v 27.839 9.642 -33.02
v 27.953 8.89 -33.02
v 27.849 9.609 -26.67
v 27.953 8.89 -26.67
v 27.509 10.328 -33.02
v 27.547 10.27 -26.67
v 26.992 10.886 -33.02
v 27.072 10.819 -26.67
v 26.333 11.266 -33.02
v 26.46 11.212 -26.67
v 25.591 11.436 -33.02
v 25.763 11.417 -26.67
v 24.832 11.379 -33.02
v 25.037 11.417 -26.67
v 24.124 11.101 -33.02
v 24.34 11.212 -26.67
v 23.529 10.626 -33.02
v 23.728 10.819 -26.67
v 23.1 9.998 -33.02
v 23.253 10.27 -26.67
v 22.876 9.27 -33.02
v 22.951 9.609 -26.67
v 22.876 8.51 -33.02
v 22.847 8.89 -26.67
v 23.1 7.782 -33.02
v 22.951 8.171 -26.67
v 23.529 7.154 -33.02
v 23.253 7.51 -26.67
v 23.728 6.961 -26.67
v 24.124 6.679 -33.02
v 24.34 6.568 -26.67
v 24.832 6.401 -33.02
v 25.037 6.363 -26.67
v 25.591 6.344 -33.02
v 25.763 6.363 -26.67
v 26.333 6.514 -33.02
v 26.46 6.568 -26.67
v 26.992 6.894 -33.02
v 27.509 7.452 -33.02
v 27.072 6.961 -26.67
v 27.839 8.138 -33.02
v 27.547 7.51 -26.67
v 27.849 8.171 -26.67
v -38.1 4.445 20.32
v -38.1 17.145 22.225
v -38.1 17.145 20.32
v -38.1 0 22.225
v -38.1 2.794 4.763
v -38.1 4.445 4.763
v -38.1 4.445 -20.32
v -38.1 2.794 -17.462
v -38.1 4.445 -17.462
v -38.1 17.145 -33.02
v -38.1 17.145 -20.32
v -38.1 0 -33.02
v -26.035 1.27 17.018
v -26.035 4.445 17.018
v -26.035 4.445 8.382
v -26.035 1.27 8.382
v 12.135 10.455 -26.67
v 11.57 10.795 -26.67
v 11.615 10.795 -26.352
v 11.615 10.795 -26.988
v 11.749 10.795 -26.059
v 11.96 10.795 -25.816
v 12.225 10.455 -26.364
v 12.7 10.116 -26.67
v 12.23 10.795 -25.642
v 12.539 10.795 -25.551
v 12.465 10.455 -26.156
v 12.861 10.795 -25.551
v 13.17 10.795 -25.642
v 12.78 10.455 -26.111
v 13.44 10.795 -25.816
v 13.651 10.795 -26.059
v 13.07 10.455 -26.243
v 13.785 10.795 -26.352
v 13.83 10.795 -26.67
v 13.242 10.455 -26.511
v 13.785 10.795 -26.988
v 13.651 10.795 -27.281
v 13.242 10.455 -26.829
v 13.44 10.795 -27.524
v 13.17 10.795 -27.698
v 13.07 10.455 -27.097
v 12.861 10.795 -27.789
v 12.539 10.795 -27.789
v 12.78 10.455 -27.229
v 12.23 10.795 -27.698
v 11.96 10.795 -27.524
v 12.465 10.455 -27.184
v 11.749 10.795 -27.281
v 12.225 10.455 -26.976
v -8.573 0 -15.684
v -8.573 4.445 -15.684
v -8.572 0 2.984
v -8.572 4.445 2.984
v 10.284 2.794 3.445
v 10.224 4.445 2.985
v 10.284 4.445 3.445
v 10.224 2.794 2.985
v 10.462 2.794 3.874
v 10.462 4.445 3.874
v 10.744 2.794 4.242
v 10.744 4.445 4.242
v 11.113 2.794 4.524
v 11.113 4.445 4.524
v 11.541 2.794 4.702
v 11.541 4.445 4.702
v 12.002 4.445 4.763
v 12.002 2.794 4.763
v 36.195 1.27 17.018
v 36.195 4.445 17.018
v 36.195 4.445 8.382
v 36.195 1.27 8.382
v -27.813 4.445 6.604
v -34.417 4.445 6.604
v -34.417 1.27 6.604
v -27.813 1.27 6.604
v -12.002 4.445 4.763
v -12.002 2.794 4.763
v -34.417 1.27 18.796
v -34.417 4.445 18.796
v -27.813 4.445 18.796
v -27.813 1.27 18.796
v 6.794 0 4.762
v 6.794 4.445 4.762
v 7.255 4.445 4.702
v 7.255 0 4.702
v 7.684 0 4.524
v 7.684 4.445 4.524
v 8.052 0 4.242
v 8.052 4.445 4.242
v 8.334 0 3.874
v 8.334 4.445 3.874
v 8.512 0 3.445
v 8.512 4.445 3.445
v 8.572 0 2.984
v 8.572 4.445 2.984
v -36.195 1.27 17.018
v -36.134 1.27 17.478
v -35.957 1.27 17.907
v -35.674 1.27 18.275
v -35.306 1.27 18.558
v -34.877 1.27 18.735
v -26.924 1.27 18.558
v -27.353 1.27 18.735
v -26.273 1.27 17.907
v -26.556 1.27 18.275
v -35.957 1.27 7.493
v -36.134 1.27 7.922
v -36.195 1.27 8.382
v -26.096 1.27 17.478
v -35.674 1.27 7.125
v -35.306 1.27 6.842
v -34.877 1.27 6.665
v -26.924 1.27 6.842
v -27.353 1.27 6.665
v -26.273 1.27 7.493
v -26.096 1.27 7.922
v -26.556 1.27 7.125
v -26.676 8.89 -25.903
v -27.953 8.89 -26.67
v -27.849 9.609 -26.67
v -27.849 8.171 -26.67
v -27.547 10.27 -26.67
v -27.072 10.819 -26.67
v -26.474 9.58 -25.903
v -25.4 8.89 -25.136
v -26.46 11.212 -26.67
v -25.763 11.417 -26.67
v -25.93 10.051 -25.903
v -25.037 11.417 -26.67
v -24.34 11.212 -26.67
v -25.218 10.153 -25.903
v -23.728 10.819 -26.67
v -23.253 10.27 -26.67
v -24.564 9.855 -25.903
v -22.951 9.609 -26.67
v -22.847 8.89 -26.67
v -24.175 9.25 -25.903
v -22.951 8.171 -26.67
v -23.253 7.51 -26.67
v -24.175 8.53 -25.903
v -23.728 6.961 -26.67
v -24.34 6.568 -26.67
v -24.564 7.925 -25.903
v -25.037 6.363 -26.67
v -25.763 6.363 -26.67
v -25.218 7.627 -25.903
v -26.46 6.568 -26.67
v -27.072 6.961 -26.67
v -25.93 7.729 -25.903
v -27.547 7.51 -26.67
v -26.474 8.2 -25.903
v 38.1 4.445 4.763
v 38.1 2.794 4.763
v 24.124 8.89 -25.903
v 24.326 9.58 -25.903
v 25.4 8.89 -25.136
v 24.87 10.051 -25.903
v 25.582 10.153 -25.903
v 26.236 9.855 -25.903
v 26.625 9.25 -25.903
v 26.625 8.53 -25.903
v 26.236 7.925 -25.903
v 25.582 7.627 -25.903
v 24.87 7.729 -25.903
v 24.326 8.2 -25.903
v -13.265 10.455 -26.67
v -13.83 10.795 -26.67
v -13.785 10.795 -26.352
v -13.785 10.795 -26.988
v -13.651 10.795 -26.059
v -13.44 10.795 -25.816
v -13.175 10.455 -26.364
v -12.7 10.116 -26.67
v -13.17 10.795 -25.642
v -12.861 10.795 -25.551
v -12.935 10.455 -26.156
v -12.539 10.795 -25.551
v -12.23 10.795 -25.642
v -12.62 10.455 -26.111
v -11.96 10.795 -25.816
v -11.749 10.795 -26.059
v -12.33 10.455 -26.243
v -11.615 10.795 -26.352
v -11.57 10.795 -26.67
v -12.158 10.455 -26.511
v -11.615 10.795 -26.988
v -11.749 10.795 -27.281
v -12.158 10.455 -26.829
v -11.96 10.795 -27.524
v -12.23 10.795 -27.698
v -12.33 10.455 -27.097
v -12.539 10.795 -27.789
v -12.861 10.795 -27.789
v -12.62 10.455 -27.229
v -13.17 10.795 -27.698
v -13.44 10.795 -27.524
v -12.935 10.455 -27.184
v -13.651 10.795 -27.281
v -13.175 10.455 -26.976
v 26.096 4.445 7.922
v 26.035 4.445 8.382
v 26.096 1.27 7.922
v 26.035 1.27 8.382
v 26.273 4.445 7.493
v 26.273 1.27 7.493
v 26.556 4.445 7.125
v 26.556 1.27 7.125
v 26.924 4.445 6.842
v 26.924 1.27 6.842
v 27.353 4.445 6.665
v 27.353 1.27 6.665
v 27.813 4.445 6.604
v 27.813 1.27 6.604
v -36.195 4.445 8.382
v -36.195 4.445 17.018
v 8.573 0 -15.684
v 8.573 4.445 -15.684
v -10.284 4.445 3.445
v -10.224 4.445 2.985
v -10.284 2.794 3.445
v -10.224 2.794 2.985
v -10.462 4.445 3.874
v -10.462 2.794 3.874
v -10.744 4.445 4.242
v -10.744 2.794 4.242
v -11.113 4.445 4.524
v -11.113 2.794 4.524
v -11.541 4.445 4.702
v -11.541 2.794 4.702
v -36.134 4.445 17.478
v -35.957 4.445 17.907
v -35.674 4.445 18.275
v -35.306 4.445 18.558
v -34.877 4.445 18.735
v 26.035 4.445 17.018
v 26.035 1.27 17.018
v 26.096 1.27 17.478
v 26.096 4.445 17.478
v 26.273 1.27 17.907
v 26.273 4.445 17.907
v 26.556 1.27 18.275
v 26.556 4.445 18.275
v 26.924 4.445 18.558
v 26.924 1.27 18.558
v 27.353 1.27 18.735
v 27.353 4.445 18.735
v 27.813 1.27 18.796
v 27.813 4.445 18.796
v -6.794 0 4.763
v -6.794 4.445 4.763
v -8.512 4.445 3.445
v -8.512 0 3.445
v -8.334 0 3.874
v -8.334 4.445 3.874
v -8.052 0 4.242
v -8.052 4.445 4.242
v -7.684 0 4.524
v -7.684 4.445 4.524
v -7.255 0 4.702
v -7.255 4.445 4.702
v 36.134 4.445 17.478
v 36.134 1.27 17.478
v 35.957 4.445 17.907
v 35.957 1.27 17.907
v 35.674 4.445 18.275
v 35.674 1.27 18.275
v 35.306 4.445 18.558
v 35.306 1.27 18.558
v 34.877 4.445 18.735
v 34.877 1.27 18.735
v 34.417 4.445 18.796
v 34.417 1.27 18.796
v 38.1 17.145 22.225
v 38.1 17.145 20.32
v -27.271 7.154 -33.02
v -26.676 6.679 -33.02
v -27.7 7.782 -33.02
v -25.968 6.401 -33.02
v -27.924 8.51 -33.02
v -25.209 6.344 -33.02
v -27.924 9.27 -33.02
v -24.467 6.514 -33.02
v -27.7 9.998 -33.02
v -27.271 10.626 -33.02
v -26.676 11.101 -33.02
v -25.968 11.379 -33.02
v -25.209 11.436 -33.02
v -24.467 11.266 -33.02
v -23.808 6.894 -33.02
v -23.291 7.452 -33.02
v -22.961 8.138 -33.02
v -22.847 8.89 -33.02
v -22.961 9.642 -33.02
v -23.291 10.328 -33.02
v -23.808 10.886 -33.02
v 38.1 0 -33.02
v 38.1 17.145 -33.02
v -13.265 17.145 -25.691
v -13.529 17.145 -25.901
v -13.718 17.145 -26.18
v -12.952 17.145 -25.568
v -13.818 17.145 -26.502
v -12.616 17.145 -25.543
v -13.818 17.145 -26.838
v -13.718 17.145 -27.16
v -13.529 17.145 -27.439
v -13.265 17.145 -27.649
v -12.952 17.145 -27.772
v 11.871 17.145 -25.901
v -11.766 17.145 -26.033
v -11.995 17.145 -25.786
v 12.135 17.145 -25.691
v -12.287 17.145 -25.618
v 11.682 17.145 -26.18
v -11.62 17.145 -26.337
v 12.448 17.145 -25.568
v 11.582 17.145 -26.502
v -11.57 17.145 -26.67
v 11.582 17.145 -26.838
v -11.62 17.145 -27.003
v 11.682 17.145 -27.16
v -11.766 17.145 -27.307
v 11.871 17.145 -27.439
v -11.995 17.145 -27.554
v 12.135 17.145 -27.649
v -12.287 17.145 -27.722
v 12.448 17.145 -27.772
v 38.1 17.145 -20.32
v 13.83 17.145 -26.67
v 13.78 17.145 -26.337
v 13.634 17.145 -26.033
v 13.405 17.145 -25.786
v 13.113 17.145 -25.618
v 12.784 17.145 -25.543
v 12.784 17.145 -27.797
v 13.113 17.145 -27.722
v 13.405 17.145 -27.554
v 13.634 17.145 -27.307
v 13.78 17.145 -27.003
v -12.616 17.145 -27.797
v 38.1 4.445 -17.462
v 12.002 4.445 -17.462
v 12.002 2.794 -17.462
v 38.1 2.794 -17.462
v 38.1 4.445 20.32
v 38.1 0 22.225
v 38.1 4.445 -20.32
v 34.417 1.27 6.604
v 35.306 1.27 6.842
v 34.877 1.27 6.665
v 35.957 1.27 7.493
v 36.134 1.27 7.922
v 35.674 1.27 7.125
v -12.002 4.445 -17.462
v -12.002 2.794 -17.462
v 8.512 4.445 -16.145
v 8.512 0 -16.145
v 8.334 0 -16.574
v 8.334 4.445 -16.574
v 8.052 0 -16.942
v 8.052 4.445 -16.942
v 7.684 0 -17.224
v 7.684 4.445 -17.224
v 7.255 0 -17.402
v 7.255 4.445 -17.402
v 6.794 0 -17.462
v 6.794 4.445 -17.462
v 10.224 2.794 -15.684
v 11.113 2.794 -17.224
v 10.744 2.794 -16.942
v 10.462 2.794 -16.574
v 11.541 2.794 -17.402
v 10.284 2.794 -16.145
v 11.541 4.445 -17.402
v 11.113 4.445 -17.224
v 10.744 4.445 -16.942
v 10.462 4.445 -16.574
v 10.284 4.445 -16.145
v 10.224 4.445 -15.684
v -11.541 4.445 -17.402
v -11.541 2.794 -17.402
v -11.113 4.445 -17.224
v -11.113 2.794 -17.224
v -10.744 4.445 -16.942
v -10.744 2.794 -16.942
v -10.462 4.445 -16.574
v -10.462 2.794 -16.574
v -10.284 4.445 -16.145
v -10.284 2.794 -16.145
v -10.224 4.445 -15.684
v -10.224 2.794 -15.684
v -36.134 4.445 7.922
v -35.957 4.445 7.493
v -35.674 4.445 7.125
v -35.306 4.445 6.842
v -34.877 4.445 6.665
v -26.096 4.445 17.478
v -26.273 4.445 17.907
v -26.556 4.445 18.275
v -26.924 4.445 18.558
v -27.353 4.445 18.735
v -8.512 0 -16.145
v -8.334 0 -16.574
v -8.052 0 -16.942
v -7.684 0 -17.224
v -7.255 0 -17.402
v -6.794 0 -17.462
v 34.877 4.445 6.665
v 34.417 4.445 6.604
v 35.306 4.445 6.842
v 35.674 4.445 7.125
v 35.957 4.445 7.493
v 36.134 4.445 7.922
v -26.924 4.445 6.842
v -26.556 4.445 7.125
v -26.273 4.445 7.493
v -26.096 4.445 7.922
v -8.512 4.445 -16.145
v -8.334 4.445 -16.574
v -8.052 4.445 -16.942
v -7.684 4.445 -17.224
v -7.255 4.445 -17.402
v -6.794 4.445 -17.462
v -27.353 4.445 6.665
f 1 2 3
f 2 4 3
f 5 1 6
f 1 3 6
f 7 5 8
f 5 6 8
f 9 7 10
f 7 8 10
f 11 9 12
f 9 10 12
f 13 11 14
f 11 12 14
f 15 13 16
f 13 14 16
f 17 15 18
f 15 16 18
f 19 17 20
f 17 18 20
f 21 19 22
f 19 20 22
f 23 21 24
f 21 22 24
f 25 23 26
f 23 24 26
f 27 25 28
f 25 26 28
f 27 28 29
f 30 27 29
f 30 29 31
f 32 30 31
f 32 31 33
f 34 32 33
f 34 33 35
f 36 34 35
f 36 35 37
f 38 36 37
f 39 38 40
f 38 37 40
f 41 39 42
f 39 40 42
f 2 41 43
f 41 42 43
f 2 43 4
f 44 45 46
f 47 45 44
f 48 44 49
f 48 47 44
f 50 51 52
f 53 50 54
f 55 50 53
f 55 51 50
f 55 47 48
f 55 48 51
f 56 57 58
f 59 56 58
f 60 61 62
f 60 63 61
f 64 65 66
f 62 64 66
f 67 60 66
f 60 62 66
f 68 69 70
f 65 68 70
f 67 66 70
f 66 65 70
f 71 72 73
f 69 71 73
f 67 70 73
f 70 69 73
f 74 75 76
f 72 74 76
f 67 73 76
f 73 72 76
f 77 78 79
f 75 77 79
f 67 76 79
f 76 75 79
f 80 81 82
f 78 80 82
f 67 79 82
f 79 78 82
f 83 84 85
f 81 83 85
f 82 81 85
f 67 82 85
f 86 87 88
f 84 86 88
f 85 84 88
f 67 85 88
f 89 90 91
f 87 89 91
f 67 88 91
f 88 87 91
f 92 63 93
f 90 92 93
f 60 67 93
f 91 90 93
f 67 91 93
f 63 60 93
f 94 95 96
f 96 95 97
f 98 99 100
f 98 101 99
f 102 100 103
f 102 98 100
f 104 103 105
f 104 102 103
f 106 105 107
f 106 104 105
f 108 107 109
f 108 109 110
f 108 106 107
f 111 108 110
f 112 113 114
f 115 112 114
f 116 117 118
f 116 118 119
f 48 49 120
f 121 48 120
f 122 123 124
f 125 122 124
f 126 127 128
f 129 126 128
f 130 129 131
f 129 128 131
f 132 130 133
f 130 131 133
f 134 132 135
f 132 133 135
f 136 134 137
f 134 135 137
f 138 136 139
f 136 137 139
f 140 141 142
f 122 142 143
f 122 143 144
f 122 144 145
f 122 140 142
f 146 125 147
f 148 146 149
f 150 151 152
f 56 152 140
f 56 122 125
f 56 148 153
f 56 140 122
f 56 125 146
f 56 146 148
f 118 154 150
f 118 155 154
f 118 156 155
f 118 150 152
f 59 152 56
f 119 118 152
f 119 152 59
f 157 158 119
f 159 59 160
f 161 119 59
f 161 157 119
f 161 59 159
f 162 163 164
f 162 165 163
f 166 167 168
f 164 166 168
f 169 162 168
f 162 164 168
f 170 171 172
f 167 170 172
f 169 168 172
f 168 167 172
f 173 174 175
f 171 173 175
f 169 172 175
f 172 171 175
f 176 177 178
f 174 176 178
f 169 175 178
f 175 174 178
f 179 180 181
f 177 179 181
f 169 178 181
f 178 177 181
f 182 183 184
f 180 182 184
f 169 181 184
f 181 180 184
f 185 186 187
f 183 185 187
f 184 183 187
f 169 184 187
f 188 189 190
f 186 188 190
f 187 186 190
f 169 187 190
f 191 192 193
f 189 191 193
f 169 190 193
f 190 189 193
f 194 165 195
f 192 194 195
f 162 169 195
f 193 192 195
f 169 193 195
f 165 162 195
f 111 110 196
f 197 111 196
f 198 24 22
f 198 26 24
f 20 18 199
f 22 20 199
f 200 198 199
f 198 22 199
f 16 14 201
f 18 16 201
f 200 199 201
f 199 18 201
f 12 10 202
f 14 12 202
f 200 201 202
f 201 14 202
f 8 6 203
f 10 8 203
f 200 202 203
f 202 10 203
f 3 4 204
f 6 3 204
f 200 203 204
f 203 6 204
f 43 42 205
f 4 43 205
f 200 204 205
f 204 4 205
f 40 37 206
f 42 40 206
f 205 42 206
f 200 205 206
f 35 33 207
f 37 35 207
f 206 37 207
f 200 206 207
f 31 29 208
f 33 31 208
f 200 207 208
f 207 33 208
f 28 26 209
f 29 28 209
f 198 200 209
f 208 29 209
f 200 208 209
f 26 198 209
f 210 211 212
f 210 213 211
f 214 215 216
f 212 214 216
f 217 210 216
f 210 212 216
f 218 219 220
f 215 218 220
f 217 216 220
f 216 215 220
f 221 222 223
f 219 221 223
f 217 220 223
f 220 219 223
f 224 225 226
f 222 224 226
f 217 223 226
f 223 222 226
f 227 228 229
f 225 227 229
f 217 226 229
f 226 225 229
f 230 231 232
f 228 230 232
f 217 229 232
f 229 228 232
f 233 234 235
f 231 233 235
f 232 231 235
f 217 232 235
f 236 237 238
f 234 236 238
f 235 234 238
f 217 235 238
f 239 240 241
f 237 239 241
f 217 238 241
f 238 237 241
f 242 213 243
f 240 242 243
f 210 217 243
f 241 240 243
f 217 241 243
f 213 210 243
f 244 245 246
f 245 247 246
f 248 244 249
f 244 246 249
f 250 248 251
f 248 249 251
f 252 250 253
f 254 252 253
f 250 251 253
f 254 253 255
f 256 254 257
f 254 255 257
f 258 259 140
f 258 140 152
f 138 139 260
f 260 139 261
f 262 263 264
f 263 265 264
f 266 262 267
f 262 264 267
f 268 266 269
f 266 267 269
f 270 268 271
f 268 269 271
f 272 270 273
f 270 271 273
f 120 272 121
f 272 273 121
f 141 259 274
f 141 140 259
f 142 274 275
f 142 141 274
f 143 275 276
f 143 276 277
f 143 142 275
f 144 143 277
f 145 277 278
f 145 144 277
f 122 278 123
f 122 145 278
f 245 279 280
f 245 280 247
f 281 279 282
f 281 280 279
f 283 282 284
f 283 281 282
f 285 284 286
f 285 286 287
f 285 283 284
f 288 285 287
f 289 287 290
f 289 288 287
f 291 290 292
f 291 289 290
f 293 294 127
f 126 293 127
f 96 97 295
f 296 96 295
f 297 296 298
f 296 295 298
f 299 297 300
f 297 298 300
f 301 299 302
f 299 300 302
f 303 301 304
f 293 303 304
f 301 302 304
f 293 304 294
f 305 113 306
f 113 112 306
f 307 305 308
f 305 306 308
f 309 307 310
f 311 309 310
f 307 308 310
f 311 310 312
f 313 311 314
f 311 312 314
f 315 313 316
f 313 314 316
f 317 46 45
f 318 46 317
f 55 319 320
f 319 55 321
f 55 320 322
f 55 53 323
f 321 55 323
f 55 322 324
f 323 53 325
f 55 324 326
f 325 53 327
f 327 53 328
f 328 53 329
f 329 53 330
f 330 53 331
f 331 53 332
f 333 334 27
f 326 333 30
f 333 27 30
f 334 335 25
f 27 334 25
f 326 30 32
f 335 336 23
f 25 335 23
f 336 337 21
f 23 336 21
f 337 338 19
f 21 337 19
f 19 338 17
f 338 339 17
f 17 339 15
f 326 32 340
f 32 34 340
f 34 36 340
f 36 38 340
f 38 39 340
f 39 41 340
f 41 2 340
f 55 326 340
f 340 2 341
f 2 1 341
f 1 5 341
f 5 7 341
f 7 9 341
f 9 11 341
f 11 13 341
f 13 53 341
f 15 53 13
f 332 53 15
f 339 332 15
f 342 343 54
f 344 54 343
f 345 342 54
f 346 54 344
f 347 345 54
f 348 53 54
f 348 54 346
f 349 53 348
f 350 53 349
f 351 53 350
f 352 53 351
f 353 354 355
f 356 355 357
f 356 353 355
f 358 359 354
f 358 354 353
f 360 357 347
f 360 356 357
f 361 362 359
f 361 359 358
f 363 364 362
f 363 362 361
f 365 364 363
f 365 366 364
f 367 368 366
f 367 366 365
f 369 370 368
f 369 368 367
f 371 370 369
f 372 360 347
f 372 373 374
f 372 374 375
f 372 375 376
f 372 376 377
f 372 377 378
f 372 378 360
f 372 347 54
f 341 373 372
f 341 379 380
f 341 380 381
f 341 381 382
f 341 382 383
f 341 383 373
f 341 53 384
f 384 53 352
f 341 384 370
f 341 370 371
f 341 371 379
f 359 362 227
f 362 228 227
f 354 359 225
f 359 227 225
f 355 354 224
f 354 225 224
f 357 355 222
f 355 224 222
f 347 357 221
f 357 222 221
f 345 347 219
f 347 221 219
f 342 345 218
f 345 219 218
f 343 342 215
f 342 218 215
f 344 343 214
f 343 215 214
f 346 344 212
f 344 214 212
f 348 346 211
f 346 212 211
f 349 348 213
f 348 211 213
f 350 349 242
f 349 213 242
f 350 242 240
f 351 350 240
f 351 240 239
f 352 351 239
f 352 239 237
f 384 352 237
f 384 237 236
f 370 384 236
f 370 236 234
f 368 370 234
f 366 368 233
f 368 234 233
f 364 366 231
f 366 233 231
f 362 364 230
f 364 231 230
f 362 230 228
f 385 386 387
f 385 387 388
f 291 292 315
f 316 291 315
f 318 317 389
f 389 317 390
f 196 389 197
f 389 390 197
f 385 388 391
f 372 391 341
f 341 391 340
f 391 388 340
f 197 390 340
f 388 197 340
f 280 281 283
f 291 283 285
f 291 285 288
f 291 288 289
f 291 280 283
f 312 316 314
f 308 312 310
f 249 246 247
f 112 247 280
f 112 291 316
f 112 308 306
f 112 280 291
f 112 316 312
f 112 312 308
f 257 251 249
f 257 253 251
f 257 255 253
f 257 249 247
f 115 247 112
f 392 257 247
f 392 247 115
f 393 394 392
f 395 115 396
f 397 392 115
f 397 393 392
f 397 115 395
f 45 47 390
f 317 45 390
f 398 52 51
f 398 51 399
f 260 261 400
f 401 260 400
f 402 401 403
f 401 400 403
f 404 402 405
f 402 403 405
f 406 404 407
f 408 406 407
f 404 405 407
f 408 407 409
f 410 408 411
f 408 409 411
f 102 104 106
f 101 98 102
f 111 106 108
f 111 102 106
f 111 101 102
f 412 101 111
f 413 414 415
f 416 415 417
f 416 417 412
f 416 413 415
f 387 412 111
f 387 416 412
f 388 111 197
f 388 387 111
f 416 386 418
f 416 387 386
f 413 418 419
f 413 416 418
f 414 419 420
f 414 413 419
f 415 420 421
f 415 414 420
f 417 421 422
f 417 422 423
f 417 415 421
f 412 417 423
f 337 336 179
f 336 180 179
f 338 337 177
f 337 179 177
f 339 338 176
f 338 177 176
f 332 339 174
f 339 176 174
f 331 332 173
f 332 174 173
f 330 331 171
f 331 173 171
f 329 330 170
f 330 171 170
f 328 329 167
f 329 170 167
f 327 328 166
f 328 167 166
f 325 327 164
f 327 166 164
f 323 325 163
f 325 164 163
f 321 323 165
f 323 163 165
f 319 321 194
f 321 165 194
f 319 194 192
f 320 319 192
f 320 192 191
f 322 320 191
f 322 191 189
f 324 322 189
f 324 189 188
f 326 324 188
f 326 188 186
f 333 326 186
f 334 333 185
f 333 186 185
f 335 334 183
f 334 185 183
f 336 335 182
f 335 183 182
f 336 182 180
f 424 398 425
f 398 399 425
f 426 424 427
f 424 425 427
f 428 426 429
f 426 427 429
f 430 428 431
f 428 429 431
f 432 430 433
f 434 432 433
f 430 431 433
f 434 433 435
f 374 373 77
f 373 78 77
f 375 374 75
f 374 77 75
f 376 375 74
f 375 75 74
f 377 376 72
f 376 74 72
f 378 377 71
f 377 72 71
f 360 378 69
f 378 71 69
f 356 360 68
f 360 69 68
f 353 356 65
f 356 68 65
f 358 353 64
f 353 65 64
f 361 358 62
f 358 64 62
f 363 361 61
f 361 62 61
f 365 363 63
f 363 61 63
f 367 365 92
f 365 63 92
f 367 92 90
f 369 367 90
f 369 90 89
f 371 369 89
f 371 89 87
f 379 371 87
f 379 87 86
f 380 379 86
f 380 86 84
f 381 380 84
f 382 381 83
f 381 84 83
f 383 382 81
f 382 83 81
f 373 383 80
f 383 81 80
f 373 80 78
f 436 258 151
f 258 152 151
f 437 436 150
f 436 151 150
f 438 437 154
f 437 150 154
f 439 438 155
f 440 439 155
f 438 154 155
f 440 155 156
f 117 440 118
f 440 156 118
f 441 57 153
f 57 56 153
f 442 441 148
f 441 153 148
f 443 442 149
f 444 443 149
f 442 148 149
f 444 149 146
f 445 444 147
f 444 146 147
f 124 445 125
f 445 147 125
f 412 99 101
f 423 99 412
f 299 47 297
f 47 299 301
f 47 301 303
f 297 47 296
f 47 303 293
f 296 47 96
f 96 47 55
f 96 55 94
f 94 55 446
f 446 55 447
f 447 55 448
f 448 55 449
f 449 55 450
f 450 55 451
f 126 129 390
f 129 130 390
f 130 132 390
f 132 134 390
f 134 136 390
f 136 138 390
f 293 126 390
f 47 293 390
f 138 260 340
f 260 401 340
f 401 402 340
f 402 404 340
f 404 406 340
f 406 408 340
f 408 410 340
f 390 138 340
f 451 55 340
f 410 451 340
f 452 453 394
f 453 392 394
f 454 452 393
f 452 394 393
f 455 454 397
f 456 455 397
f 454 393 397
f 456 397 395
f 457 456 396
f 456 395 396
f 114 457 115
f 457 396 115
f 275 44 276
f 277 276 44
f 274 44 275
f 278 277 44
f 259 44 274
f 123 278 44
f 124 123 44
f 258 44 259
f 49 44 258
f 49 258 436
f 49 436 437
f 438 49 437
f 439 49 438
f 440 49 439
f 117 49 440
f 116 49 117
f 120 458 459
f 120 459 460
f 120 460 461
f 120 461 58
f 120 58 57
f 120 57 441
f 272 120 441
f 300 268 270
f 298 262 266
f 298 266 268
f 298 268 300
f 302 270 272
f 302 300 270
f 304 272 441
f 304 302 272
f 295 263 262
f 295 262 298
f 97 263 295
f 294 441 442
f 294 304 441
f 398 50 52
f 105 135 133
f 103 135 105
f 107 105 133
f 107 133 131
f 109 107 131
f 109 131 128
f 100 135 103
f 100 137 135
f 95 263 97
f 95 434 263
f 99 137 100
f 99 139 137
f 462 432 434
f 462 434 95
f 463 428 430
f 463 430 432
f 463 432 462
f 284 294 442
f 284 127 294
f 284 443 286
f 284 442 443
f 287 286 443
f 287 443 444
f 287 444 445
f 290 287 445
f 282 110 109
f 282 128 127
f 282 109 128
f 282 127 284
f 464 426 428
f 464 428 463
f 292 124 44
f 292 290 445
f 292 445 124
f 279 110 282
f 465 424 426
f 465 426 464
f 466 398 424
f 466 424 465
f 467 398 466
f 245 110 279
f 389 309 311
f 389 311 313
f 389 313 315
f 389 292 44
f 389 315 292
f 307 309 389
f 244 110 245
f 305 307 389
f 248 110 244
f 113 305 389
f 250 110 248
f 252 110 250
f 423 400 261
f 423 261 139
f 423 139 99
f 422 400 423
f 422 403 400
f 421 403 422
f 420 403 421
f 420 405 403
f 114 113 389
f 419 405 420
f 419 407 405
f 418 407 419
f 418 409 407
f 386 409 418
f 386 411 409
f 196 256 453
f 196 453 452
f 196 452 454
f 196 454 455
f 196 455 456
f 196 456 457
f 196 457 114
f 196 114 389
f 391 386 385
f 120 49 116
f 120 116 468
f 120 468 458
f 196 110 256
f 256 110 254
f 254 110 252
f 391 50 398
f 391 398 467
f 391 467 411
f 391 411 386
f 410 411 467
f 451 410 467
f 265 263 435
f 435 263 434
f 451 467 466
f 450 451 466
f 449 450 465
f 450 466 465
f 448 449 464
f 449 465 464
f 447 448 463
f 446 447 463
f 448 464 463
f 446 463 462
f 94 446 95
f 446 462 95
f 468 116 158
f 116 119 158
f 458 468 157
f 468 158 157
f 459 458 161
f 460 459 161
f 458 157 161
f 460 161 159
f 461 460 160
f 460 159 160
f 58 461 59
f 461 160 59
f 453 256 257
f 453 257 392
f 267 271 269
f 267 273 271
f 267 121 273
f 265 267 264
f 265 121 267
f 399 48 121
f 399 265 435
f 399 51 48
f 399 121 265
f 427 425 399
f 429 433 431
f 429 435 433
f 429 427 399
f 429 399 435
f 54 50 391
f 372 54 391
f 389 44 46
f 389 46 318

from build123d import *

# Parameters (mm, degrees)
SKETCH1_W                   = 76.2
SKETCH1_H                   = 44.45
BOSS_EXTRUDE1_DEPTH         = 4.445
SKETCH2_W                   = 76.2
SKETCH2_H                   = 1.905
BOSS_EXTRUDE2_DEPTH         = 12.7
CUT_EXTRUDE3_DEPTH          = 46.900442536
SKETCH7_W                   = 27.8765
SKETCH7_H                   = 22.225
CUT_EXTRUDE4_DEPTH          = 1.651
SKETCH11_W                  = 10.16
SKETCH11_H                  = 12.192
CUT_EXTRUDE6_DEPTH          = 3.175
SKETCH13_W                  = 76.2
SKETCH13_H                  = 17.145
BOSS_EXTRUDE3_DEPTH         = 12.7
FILLET1_R                   = 1.778
F_1_4_20_TAPPED_HOLE1_D     = 5.1054
F_1_4_20_TAPPED_HOLE1_DEPTH = 6.35
F_1_4_20_TAPPED_HOLE1_TIP   = 1.533816902
F_4_40_TAPPED_HOLE1_D       = 2.2606
F_4_40_TAPPED_HOLE1_DEPTH   = 6.35
F_4_40_TAPPED_HOLE1_TIP     = 0.679152758


with BuildPart() as part:
    # Sketch1 → Boss-Extrude1 (new body)
    with BuildSketch(Plane(origin=(0, 0, 0), x_dir=(1, 0, 0), z_dir=(0, 1, 0))):
        Rectangle(SKETCH1_W, SKETCH1_H)
    extrude(amount=BOSS_EXTRUDE1_DEPTH)

    # Sketch2 → Boss-Extrude2 (add)
    with BuildSketch(Plane(origin=(0, 4.445, 0), x_dir=(1, 0, 0), z_dir=(0, 1, 0))):
        with Locations((0, 21.2725)):
            Rectangle(SKETCH2_W, SKETCH2_H)
        with Locations((0, -21.2725)):
            Rectangle(SKETCH2_W, SKETCH2_H)
    extrude(amount=BOSS_EXTRUDE2_DEPTH)

    # Sketch6 → Cut-Extrude3 (cut, through all)
    with BuildSketch(Plane(origin=(0, 4.445, 0), x_dir=(1, 0, 0), z_dir=(0, 1, 0))):
        with BuildLine():
            Line((-8.5725, 15.6845), (-8.5725, -2.9845))
            ThreePointArc((-8.5725, -2.9845), (-8.051735857, -4.241735857), (-6.7945, -4.7625))
            Line((-6.7945, -4.7625), (6.7945, -4.7625))
            ThreePointArc((6.7945, -4.7625), (8.051735857, -4.241735857), (8.5725, -2.9845))
            Line((8.5725, -2.9845), (8.5725, 15.6845))
            ThreePointArc((8.5725, 15.6845), (8.051735857, 16.941735857), (6.7945, 17.4625))
            Line((6.7945, 17.4625), (-6.7945, 17.4625))
            ThreePointArc((-6.7945, 17.4625), (-8.051735857, 16.941735857), (-8.5725, 15.6845))
        make_face()
    extrude(amount=-CUT_EXTRUDE3_DEPTH, mode=Mode.SUBTRACT)

    # Sketch7 → Cut-Extrude4 (cut)
    with BuildSketch(Plane(origin=(0, 4.445, 0), x_dir=(1, 0, 0), z_dir=(0, 1, 0))):
        with Locations((-24.16175, 6.35)):
            Rectangle(SKETCH7_W, SKETCH7_H)
        with Locations((24.16175, 6.35)):
            Rectangle(SKETCH7_W, SKETCH7_H)
    extrude(amount=-CUT_EXTRUDE4_DEPTH, mode=Mode.SUBTRACT)

    # Sketch11 → Cut-Extrude6 (cut)
    with BuildSketch(Plane(origin=(0, 4.445, 0), x_dir=(1, 0, 0), z_dir=(0, 1, 0))):
        with Locations((-31.115, -12.7)):
            Rectangle(SKETCH11_W, SKETCH11_H)
        with Locations((31.115, -12.7)):
            Rectangle(SKETCH11_W, SKETCH11_H)
    extrude(amount=-CUT_EXTRUDE6_DEPTH, mode=Mode.SUBTRACT)

    # Sketch13 → Boss-Extrude3 (add)
    with BuildSketch(Plane.XY.offset(-20.32)):
        with Locations((0, 8.5725)):
            Rectangle(SKETCH13_W, SKETCH13_H)
    extrude(amount=-BOSS_EXTRUDE3_DEPTH)

    # Fillet1
    fillet1_edges = [part.edges().sort_by_distance(p)[0] for p in [
        (-26.035, 2.8575, 18.796),
        (-36.195, 2.8575, 18.796),
        (26.035, 2.8575, 18.796),
        (26.035, 2.8575, 6.604),
        (36.195, 2.8575, 6.604),
        (36.195, 2.8575, 18.796),
        (-10.2235, 3.6195, -17.4625),
        (-10.2235, 3.6195, 4.7625),
        (10.2235, 3.6195, -17.4625),
        (10.2235, 3.6195, 4.7625),
        (-36.195, 2.8575, 6.604),
        (-26.035, 2.8575, 6.604),
    ]]
    fillet(fillet1_edges, radius=FILLET1_R)

    # 1/4-20 Tapped Hole1
    with Locations(Plane(origin=(0, 0, -33.02), x_dir=(-1, 0, 0), z_dir=(0, 0, -1))):
        with Locations((-25.4, 8.89), (25.4, 8.89)):
            Hole(F_1_4_20_TAPPED_HOLE1_D / 2, depth=F_1_4_20_TAPPED_HOLE1_DEPTH)
            with Locations((0, 0, -(F_1_4_20_TAPPED_HOLE1_DEPTH + F_1_4_20_TAPPED_HOLE1_TIP / 2))):  # 118° drill point
                Cone(0, F_1_4_20_TAPPED_HOLE1_D / 2, F_1_4_20_TAPPED_HOLE1_TIP, mode=Mode.SUBTRACT)

    # #4-40 Tapped Hole1
    with Locations(Plane(origin=(0, 17.145, 0), x_dir=(-1, 0, 0), z_dir=(0, 1, 0))):
        with Locations((12.7, -26.67), (-12.7, -26.67)):
            Hole(F_4_40_TAPPED_HOLE1_D / 2, depth=F_4_40_TAPPED_HOLE1_DEPTH)
            with Locations((0, 0, -(F_4_40_TAPPED_HOLE1_DEPTH + F_4_40_TAPPED_HOLE1_TIP / 2))):  # 118° drill point
                Cone(0, F_4_40_TAPPED_HOLE1_D / 2, F_4_40_TAPPED_HOLE1_TIP, mode=Mode.SUBTRACT)


solid = part.part
